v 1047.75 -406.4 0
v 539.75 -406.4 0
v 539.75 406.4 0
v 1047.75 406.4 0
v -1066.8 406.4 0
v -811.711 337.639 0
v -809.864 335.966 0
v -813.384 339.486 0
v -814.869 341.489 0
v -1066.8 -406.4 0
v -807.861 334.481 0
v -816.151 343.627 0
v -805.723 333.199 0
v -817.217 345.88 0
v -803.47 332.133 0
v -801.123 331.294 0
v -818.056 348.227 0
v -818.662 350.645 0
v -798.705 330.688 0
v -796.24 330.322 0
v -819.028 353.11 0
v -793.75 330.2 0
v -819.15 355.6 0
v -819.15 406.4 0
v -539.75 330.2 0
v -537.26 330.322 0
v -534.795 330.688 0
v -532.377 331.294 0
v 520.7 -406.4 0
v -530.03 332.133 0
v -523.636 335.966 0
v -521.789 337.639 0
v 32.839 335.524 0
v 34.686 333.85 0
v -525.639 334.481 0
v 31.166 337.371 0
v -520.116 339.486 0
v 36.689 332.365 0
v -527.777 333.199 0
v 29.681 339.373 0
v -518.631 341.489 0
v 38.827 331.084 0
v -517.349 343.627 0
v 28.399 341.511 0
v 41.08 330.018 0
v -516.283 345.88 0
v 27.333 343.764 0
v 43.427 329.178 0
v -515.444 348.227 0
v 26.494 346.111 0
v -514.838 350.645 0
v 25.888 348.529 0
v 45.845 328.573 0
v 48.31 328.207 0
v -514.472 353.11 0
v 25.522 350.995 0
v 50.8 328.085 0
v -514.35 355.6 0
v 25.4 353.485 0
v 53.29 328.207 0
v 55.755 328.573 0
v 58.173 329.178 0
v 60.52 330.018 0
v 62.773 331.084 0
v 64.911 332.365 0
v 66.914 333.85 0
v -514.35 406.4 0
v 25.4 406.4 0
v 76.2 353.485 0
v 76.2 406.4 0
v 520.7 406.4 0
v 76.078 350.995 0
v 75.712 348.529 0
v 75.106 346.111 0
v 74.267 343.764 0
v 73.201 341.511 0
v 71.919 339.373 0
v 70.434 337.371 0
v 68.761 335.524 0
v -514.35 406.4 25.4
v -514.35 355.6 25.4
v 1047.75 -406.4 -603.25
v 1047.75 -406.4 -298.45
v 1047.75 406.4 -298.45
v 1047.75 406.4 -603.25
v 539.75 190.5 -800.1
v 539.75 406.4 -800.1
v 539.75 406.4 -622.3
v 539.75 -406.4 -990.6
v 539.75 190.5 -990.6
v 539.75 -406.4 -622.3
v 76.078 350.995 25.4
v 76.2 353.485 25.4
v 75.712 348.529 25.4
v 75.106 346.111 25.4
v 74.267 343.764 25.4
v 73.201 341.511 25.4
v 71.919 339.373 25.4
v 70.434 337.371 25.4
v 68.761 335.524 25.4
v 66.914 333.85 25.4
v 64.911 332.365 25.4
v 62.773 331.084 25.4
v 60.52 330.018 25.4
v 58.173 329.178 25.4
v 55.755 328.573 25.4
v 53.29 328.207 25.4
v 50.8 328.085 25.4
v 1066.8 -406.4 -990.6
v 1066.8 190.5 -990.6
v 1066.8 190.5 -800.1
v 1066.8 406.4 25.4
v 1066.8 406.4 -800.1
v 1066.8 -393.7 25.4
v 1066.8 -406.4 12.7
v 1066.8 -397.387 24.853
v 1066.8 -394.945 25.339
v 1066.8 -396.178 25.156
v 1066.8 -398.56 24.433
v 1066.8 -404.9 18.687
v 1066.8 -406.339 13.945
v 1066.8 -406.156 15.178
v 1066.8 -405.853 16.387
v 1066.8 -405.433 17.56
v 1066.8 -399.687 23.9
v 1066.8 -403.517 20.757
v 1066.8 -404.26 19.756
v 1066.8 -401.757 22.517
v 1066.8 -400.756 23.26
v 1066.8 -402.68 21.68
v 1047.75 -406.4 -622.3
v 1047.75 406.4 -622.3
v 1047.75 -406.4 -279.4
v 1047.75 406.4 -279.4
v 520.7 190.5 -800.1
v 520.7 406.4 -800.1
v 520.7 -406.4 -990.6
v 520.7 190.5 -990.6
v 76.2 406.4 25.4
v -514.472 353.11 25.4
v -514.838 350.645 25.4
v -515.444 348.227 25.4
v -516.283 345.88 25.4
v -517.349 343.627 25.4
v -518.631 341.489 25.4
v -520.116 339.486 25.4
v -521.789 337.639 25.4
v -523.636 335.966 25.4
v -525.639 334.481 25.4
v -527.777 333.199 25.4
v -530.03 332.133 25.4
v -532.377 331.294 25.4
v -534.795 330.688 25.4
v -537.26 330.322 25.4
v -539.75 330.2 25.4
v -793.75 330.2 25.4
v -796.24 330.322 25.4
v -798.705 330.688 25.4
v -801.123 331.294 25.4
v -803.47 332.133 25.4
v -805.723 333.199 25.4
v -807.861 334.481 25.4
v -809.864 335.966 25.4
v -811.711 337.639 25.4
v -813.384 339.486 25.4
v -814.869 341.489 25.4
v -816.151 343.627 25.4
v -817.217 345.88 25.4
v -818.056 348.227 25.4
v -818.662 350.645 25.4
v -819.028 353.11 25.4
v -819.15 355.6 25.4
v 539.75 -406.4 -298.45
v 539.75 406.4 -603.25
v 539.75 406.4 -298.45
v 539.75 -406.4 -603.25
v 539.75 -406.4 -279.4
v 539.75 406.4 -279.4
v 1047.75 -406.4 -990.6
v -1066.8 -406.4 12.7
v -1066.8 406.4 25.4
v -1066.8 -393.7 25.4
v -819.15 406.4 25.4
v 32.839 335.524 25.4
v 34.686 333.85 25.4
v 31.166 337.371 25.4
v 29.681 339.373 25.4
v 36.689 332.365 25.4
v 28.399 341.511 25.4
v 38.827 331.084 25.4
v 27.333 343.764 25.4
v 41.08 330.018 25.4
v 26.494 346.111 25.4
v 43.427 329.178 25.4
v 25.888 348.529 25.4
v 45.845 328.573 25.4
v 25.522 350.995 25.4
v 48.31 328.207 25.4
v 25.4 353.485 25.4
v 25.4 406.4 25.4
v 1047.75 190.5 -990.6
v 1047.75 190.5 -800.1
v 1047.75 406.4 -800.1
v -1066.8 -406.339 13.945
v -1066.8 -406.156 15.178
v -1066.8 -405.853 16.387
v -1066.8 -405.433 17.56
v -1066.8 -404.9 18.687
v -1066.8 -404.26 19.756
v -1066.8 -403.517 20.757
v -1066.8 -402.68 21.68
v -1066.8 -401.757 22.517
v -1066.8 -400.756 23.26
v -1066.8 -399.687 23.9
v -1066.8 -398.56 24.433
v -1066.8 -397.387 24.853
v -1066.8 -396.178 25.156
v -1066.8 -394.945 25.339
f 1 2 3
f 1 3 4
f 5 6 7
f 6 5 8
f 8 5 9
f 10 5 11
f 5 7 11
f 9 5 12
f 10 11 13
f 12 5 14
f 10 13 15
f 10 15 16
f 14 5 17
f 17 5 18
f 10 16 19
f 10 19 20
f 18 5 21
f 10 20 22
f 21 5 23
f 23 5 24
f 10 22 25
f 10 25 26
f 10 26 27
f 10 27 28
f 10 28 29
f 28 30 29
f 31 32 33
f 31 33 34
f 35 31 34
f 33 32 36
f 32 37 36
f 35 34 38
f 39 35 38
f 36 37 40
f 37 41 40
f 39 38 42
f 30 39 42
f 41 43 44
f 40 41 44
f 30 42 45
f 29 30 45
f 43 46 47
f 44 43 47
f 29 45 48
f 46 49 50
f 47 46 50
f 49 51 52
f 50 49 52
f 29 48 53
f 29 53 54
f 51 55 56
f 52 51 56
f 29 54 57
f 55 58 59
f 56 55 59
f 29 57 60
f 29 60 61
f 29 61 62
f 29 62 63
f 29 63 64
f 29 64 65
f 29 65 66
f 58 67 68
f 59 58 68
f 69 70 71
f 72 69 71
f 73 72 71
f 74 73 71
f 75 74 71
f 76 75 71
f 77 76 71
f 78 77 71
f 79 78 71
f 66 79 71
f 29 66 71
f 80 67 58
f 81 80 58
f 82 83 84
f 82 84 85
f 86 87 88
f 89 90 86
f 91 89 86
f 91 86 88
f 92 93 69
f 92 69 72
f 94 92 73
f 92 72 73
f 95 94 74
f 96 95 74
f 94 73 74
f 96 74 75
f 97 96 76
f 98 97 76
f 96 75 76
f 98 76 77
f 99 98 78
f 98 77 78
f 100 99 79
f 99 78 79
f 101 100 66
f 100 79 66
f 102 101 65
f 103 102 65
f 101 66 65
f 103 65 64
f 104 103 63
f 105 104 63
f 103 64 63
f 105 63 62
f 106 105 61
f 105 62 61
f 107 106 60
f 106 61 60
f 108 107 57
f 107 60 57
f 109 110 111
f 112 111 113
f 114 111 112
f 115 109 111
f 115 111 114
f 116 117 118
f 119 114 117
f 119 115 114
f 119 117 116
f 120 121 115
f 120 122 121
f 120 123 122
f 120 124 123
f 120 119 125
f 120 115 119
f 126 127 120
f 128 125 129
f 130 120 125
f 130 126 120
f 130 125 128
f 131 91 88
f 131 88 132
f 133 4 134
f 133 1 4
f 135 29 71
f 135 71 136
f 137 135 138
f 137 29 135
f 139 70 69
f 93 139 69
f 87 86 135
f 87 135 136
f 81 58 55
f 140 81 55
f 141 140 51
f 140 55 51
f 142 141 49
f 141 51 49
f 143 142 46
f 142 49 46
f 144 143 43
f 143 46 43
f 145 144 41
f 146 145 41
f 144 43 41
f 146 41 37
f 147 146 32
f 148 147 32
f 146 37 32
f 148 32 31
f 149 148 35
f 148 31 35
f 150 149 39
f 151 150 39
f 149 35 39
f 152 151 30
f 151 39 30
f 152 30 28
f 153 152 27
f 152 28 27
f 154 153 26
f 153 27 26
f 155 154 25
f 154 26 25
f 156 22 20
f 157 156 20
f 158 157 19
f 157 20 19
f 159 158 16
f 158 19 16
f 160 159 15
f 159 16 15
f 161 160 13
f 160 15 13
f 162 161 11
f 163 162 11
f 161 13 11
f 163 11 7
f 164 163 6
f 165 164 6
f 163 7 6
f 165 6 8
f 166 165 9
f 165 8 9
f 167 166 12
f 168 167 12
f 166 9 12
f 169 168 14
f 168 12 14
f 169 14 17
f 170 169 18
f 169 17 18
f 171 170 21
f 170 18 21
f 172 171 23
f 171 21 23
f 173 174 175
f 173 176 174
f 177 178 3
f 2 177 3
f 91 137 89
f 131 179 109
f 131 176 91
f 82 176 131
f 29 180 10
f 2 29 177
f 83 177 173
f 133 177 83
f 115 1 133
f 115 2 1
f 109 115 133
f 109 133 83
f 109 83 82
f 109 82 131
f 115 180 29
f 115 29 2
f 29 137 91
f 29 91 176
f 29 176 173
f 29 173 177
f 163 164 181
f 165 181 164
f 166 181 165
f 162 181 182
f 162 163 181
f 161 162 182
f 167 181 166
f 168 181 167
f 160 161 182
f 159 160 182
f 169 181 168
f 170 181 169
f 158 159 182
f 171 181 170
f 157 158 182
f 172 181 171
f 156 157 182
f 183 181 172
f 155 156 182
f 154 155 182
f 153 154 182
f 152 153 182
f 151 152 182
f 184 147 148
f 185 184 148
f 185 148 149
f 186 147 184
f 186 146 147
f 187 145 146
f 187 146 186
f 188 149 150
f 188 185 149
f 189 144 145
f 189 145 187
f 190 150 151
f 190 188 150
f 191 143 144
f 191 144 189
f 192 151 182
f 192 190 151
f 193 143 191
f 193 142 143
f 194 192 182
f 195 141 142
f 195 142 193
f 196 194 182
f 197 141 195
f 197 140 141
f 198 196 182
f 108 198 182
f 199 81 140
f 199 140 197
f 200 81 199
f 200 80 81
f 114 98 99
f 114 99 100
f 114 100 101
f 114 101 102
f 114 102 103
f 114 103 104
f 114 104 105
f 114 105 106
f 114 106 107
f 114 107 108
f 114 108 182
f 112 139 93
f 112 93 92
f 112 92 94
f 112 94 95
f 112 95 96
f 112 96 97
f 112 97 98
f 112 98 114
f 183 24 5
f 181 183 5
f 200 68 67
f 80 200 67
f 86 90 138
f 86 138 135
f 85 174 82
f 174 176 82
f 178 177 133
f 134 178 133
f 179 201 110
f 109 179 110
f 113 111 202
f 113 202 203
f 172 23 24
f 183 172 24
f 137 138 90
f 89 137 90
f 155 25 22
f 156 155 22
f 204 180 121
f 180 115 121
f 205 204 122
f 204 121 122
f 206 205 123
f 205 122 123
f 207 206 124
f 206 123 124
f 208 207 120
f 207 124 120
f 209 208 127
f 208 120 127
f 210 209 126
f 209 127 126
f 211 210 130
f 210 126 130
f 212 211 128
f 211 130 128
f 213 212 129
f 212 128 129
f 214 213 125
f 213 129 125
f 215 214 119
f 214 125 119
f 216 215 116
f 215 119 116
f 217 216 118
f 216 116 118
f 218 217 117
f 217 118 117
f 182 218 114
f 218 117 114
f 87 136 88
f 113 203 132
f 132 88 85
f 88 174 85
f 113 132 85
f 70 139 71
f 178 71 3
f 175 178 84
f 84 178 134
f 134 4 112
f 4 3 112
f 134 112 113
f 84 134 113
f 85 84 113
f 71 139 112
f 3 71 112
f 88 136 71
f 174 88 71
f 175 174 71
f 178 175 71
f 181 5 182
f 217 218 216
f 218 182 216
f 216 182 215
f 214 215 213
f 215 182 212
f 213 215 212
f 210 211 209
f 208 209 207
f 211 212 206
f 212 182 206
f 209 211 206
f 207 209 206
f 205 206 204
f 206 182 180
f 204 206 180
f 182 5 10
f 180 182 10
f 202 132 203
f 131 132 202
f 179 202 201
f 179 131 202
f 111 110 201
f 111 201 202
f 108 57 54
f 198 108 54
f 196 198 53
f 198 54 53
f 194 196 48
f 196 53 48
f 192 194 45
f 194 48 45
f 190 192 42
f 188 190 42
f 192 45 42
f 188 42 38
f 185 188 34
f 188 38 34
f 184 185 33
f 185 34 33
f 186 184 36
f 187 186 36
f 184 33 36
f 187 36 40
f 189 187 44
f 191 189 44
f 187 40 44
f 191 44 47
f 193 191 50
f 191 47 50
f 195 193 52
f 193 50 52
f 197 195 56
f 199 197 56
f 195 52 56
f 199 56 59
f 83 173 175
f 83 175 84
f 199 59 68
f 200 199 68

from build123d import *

# Parameters (mm, degrees)
F1_DEPTH      = 25.4
F2_R          = 12.7
F3_W          = 508
F3_H          = 19.05
F4_DEPTH      = 406.4
F4_DEPTH_BACK = 406.4
F5_W          = 215.9
F5_H          = 190.5
F6_DEPTH      = 2133.601


with BuildPart() as f1:
    # F0 (on Top) → F1 (new body)
    with BuildSketch(Plane.XY):
        with BuildLine():
            Line((-819.15, 406.4), (-1066.8, 406.4))
            Line((-1066.8, 406.4), (-1066.8, -406.4))
            Line((-1066.8, -406.4), (1066.8, -406.4))
            Line((1066.8, -406.4), (1066.8, 406.4))
            Line((1066.8, 406.4), (76.2, 406.4))
            Line((76.2, 406.4), (76.2, 353.484618))
            ThreePointArc((76.2, 353.484618), (68.760512, 335.524106), (50.8, 328.084618))
            ThreePointArc((50.8, 328.084618), (32.839488, 335.524106), (25.4, 353.484618))
            Line((25.4, 353.484618), (25.4, 406.4))
            Line((25.4, 406.4), (-514.35, 406.4))
            Line((-514.35, 406.4), (-514.35, 355.6))
            ThreePointArc((-514.35, 355.6), (-521.789488, 337.639488), (-539.75, 330.2))
            Line((-539.75, 330.2), (-793.75, 330.2))
            ThreePointArc((-793.75, 330.2), (-811.710512, 337.639488), (-819.15, 355.6))
            Line((-819.15, 355.6), (-819.15, 406.4))
        make_face()
    extrude(amount=F1_DEPTH)

    # F2
    f2_edges = [f1.edges().sort_by_distance(p)[0] for p in [
        (0, -406.4, 25.4),
    ]]
    fillet(f2_edges, radius=F2_R)

    # F3 (on Front) → F4 (join, two sides)
    with BuildSketch(Plane.XZ) as f4_sk:
        Polygon((1066.8, -990.6), (1066.8, 0), (1047.75, 0), (1047.75, -279.4), (1047.75, -298.45), (1047.75, -603.25), (1047.75, -622.3), (1047.75, -990.6), align=None)
        Polygon((539.75, -298.45), (539.75, -279.4), (539.75, 0), (520.7, 0), (520.7, -990.6), (539.75, -990.6), (539.75, -622.3), (539.75, -603.25), align=None)
        with Locations((793.75, -288.925)):
            Rectangle(F3_W, F3_H)
        with Locations((793.75, -612.775)):
            Rectangle(F3_W, F3_H)
    extrude(amount=F4_DEPTH)
    extrude(f4_sk.sketch, amount=-F4_DEPTH_BACK)

    # F5 (on face) → F6 (cut, through all)
    with BuildSketch(Plane.YZ.offset(1066.8)):
        with Locations((298.45, -895.35)):
            Rectangle(F5_W, F5_H)
    extrude(amount=-F6_DEPTH, mode=Mode.SUBTRACT)


solid = f1.part
